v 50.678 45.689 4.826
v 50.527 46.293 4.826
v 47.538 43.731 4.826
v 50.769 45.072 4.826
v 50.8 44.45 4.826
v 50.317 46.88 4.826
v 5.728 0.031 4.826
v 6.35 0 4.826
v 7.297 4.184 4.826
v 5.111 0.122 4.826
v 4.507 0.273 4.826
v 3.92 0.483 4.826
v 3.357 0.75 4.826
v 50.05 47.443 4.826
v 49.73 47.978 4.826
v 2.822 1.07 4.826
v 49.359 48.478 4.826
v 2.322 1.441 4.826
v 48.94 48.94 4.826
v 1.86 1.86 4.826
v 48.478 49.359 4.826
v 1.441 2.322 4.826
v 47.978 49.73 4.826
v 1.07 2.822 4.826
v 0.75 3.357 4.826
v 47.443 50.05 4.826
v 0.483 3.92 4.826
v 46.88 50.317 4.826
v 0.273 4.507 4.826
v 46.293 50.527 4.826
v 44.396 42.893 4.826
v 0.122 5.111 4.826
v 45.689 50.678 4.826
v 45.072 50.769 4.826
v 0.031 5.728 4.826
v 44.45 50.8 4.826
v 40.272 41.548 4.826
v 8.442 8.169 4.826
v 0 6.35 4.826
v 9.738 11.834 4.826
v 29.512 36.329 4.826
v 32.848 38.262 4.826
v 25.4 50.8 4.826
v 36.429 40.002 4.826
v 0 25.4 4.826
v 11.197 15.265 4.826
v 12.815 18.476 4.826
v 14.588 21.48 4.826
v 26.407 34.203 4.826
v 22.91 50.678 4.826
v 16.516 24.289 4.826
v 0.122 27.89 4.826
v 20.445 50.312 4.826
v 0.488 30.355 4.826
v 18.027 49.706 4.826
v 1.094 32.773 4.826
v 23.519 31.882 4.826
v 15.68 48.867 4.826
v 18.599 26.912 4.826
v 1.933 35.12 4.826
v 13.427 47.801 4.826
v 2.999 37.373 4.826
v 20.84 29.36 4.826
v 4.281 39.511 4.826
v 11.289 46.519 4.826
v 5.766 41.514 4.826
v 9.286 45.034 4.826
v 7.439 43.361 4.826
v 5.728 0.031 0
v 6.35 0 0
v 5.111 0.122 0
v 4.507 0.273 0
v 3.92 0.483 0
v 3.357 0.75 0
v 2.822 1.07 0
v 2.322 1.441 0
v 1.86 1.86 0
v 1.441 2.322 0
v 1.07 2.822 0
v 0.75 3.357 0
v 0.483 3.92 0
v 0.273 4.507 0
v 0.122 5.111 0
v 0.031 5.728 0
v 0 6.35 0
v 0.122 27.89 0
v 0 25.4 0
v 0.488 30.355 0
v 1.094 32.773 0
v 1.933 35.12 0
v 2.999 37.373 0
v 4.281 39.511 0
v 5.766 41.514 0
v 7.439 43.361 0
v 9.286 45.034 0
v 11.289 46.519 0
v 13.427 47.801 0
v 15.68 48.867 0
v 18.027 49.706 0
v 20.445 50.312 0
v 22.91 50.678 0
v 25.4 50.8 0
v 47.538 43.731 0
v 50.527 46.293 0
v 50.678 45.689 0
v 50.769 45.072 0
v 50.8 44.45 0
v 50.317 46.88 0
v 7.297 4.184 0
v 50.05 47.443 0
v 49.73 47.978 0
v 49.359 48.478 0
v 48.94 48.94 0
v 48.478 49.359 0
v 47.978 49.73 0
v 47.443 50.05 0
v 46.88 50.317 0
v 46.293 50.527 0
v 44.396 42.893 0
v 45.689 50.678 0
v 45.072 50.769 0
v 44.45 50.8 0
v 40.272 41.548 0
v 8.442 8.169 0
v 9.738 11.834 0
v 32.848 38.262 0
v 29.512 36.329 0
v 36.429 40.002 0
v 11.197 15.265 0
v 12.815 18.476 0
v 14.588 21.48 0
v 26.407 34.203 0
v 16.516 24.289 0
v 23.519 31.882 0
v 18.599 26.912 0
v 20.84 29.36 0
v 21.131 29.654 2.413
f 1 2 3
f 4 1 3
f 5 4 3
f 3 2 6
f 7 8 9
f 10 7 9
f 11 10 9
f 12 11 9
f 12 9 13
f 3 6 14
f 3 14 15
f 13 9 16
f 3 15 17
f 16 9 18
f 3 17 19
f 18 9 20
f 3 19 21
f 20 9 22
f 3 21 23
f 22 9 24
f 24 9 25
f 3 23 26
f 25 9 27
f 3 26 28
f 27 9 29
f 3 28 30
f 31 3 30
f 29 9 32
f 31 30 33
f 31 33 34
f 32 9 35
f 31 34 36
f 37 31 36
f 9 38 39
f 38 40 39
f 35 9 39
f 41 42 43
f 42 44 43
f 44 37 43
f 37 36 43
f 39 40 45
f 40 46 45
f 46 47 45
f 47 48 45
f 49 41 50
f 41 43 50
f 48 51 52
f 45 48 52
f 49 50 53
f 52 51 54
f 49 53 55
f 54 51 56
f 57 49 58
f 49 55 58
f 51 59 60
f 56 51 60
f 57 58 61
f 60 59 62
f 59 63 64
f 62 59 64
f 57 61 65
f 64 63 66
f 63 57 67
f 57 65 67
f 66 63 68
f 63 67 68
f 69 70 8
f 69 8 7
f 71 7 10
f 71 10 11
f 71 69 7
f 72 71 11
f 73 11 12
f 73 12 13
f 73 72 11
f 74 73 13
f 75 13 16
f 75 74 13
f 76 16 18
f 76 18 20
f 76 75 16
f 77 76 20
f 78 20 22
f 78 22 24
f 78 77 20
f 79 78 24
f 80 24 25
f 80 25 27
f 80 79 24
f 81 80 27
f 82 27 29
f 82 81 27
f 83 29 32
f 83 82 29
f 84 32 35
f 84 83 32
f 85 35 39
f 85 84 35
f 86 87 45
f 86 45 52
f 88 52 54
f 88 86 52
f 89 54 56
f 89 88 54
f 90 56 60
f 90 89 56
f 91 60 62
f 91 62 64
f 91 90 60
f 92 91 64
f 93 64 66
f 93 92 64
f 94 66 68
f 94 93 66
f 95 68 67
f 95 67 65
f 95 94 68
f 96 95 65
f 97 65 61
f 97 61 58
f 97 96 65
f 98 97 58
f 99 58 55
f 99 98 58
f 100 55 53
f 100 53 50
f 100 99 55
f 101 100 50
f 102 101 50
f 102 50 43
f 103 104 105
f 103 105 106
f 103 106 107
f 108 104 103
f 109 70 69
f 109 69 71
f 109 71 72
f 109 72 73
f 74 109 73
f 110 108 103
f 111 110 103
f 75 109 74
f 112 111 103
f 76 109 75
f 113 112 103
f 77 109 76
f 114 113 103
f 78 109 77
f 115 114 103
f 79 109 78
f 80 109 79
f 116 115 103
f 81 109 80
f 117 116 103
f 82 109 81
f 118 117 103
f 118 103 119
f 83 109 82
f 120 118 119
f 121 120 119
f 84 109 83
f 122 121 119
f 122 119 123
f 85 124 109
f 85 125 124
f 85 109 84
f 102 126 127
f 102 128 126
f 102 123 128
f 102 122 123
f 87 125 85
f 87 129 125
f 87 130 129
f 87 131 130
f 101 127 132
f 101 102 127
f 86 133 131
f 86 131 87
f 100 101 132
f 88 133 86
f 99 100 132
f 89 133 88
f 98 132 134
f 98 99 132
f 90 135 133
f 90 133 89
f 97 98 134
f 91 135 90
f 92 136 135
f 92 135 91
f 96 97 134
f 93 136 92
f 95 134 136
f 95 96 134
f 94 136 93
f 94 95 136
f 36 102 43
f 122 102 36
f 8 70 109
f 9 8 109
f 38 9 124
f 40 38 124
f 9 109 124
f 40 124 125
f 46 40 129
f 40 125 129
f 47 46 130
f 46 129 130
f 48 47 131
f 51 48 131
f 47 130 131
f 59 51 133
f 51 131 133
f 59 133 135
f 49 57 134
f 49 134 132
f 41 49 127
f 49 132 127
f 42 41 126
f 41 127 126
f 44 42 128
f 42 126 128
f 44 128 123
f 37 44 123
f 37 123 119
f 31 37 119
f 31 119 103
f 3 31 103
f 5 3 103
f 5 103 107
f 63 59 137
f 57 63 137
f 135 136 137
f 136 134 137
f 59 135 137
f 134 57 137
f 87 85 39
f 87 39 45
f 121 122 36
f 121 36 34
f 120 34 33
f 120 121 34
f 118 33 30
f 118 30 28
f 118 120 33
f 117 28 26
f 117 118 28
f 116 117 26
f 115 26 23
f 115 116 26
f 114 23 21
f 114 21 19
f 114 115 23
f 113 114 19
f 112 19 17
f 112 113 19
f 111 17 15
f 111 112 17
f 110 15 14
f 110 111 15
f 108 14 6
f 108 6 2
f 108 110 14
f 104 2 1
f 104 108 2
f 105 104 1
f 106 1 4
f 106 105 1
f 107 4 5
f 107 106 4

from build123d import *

# Parameters (mm, degrees)
BOSS_EXTRUDE1_DEPTH = 4.826


with BuildPart() as part:
    # Sketch1 → Boss-Extrude1 (new body)
    with BuildSketch(Plane.XY):
        with BuildLine():
            Line((0, 6.35), (0, 25.4))
            ThreePointArc((0, 25.4), (7.439487758, 43.360512242), (25.4, 50.8))
            Line((25.4, 50.8), (44.45, 50.8))
            ThreePointArc((44.45, 50.8), (48.940128061, 48.940128061), (50.8, 44.45))
            add(Edge.make_bspline(
                [(6.35, 0), (13.686894428, 37.082177492), (50.8, 44.45)],
                knots=[0, 0, 0, 1, 1, 1], degree=2))
            ThreePointArc((6.35, 0), (1.859871939, 1.859871939), (0, 6.35))
        make_face()
    extrude(amount=BOSS_EXTRUDE1_DEPTH)


solid = part.part
